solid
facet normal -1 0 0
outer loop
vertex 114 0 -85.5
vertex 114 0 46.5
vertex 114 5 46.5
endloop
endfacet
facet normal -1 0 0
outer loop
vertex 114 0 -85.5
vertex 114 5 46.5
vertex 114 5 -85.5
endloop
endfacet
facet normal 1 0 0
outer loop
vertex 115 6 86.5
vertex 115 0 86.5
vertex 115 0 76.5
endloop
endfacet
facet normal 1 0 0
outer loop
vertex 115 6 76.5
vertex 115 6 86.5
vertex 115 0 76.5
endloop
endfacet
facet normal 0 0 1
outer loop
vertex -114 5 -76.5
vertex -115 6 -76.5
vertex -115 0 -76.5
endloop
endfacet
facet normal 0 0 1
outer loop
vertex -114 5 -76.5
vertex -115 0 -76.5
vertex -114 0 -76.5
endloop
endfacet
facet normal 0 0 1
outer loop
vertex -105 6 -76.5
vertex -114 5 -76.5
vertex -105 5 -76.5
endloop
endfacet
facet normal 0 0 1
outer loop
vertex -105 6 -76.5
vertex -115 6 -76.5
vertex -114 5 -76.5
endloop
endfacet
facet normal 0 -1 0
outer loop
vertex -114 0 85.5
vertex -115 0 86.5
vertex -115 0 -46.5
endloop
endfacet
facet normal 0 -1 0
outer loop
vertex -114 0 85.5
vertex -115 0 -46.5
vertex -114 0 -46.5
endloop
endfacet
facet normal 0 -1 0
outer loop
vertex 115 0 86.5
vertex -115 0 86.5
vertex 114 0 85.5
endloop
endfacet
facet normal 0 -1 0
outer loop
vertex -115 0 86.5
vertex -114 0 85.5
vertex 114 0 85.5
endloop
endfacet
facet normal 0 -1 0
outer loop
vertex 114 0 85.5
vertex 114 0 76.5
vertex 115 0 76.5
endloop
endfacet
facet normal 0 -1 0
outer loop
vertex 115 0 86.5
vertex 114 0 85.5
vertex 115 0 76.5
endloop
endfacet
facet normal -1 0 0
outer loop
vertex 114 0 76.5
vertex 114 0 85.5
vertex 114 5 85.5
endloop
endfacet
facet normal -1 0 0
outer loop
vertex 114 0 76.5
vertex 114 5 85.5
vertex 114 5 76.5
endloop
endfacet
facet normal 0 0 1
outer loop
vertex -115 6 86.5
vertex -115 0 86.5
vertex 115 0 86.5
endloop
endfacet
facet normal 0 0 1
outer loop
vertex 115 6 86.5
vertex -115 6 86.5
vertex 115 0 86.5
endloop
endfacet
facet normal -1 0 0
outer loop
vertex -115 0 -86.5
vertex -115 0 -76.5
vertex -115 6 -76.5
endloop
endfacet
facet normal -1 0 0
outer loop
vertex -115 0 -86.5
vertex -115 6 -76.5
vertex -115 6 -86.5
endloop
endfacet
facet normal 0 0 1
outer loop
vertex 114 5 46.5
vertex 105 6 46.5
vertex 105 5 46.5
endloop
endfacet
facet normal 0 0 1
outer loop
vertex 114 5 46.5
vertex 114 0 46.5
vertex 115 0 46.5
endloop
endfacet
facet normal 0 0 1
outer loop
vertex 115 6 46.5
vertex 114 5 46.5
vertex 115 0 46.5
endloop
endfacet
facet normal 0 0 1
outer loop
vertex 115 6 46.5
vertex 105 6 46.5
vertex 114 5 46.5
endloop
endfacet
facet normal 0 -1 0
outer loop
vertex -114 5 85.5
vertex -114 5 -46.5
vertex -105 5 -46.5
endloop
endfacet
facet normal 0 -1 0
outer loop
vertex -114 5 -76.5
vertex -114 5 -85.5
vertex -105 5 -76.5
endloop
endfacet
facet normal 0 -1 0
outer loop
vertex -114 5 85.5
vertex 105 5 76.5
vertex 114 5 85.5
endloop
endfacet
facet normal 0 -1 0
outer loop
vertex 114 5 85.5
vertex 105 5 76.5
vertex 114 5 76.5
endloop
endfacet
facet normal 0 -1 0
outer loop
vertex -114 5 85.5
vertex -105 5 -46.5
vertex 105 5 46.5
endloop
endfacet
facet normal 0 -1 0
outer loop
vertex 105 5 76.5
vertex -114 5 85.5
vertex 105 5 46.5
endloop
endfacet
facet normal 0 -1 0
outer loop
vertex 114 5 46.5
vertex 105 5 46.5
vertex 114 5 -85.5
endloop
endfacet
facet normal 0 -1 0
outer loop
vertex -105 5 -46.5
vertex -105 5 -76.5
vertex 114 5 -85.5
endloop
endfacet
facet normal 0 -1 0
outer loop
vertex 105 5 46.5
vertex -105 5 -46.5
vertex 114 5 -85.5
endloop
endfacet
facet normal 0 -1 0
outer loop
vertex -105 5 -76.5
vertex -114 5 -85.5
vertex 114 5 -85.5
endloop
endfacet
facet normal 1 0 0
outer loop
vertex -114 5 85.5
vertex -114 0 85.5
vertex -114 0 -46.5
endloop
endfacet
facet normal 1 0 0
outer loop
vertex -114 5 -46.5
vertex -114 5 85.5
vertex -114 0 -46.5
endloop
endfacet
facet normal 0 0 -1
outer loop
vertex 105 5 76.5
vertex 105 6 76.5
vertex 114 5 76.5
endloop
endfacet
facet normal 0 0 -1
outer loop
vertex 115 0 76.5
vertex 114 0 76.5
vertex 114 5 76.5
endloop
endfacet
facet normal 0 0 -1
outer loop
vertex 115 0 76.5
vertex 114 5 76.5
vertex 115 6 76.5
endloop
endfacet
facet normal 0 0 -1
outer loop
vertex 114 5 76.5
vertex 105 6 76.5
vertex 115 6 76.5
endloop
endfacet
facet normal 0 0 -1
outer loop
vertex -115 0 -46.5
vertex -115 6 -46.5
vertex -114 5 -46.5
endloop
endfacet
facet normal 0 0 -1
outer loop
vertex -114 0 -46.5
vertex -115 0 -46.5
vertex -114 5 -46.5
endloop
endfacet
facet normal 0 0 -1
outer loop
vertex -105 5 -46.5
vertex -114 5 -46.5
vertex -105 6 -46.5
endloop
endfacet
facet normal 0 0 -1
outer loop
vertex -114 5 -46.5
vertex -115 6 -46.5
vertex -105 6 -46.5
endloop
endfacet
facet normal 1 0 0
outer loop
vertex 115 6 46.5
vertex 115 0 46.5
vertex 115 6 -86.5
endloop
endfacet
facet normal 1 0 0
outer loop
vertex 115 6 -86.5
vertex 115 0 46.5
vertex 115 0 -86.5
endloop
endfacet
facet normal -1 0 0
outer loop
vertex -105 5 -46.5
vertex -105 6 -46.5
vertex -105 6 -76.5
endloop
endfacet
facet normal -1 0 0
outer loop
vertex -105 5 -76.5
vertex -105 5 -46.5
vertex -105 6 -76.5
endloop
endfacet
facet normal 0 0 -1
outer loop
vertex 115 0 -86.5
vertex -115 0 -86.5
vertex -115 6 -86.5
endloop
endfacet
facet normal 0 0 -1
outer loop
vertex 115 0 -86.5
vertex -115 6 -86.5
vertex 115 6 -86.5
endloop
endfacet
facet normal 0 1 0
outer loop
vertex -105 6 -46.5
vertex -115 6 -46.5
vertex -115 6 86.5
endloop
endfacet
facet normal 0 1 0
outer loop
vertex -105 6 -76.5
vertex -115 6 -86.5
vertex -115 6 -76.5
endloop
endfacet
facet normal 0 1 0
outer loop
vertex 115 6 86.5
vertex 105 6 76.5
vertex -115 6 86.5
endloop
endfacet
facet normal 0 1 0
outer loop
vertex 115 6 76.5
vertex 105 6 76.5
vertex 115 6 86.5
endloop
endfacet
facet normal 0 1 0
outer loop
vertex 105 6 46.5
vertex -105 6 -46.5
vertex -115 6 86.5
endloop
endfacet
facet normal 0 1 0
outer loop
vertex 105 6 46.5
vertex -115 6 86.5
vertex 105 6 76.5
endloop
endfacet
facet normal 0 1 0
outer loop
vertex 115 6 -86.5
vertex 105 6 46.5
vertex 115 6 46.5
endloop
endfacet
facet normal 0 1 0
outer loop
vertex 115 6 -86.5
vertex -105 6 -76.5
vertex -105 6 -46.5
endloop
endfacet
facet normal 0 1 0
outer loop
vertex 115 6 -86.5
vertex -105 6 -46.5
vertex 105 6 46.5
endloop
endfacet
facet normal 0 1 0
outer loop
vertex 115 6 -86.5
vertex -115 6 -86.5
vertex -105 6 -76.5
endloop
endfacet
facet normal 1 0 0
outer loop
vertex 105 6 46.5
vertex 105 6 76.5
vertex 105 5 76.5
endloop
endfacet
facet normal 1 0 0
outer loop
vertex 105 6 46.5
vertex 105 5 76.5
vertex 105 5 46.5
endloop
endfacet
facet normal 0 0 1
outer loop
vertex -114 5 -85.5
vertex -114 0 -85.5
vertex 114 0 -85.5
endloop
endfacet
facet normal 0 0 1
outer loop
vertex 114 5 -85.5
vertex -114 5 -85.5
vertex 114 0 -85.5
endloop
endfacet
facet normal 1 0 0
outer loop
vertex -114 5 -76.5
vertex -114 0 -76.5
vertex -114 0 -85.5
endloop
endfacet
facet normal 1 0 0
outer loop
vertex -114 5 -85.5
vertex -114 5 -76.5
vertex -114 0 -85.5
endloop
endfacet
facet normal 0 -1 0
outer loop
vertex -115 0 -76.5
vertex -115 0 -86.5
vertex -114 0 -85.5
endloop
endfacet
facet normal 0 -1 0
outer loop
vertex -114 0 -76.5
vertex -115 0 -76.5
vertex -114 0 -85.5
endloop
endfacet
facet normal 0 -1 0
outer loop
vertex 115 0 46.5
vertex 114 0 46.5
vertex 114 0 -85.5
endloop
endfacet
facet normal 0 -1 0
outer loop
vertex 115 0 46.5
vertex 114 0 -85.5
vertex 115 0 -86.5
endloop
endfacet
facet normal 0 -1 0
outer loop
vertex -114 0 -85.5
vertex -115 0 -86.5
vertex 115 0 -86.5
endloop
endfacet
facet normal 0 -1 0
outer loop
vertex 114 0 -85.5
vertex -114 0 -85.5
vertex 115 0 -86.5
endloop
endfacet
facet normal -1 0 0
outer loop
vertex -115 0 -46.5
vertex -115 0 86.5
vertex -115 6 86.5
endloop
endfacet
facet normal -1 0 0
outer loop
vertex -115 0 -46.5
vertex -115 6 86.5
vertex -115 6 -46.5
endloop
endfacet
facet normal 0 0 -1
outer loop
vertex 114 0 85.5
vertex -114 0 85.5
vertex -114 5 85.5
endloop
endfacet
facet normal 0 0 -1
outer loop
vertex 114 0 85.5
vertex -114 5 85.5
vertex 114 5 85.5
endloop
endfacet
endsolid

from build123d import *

# Parameters (mm, degrees)
SKETCH1_W           = 230
SKETCH1_H           = 173
BOSS_EXTRUDE1_DEPTH = 6
SKETCH2_W           = 228
SKETCH2_H           = 171
CUT_EXTRUDE1_DEPTH  = 5
SKETCH3_W           = 10
SKETCH3_H           = 30
CUT_EXTRUDE2_DEPTH  = 145.025171411


with BuildPart() as part:
    # Sketch1 → Boss-Extrude1 (new body)
    with BuildSketch(Plane(origin=(0, 0, 0), x_dir=(1, 0, 0), z_dir=(0, 1, 0))):
        Rectangle(SKETCH1_W, SKETCH1_H)
    extrude(amount=BOSS_EXTRUDE1_DEPTH)

    # Sketch2 → Cut-Extrude1 (cut)
    with BuildSketch(Plane(origin=(0, 0, 0), x_dir=(1, 0, 0), z_dir=(0, 1, 0))):
        Rectangle(SKETCH2_W, SKETCH2_H)
    extrude(amount=CUT_EXTRUDE1_DEPTH, mode=Mode.SUBTRACT)

    # Sketch3 → Cut-Extrude2 (cut, through all)
    with BuildSketch(Plane(origin=(0, 6, 0), x_dir=(1, 0, 0), z_dir=(0, 1, 0))):
        with Locations((110, -61.5)):
            Rectangle(SKETCH3_W, SKETCH3_H)
        with Locations((-110, 61.5)):
            Rectangle(SKETCH3_W, SKETCH3_H)
    extrude(amount=-CUT_EXTRUDE2_DEPTH, mode=Mode.SUBTRACT)


solid = part.part
